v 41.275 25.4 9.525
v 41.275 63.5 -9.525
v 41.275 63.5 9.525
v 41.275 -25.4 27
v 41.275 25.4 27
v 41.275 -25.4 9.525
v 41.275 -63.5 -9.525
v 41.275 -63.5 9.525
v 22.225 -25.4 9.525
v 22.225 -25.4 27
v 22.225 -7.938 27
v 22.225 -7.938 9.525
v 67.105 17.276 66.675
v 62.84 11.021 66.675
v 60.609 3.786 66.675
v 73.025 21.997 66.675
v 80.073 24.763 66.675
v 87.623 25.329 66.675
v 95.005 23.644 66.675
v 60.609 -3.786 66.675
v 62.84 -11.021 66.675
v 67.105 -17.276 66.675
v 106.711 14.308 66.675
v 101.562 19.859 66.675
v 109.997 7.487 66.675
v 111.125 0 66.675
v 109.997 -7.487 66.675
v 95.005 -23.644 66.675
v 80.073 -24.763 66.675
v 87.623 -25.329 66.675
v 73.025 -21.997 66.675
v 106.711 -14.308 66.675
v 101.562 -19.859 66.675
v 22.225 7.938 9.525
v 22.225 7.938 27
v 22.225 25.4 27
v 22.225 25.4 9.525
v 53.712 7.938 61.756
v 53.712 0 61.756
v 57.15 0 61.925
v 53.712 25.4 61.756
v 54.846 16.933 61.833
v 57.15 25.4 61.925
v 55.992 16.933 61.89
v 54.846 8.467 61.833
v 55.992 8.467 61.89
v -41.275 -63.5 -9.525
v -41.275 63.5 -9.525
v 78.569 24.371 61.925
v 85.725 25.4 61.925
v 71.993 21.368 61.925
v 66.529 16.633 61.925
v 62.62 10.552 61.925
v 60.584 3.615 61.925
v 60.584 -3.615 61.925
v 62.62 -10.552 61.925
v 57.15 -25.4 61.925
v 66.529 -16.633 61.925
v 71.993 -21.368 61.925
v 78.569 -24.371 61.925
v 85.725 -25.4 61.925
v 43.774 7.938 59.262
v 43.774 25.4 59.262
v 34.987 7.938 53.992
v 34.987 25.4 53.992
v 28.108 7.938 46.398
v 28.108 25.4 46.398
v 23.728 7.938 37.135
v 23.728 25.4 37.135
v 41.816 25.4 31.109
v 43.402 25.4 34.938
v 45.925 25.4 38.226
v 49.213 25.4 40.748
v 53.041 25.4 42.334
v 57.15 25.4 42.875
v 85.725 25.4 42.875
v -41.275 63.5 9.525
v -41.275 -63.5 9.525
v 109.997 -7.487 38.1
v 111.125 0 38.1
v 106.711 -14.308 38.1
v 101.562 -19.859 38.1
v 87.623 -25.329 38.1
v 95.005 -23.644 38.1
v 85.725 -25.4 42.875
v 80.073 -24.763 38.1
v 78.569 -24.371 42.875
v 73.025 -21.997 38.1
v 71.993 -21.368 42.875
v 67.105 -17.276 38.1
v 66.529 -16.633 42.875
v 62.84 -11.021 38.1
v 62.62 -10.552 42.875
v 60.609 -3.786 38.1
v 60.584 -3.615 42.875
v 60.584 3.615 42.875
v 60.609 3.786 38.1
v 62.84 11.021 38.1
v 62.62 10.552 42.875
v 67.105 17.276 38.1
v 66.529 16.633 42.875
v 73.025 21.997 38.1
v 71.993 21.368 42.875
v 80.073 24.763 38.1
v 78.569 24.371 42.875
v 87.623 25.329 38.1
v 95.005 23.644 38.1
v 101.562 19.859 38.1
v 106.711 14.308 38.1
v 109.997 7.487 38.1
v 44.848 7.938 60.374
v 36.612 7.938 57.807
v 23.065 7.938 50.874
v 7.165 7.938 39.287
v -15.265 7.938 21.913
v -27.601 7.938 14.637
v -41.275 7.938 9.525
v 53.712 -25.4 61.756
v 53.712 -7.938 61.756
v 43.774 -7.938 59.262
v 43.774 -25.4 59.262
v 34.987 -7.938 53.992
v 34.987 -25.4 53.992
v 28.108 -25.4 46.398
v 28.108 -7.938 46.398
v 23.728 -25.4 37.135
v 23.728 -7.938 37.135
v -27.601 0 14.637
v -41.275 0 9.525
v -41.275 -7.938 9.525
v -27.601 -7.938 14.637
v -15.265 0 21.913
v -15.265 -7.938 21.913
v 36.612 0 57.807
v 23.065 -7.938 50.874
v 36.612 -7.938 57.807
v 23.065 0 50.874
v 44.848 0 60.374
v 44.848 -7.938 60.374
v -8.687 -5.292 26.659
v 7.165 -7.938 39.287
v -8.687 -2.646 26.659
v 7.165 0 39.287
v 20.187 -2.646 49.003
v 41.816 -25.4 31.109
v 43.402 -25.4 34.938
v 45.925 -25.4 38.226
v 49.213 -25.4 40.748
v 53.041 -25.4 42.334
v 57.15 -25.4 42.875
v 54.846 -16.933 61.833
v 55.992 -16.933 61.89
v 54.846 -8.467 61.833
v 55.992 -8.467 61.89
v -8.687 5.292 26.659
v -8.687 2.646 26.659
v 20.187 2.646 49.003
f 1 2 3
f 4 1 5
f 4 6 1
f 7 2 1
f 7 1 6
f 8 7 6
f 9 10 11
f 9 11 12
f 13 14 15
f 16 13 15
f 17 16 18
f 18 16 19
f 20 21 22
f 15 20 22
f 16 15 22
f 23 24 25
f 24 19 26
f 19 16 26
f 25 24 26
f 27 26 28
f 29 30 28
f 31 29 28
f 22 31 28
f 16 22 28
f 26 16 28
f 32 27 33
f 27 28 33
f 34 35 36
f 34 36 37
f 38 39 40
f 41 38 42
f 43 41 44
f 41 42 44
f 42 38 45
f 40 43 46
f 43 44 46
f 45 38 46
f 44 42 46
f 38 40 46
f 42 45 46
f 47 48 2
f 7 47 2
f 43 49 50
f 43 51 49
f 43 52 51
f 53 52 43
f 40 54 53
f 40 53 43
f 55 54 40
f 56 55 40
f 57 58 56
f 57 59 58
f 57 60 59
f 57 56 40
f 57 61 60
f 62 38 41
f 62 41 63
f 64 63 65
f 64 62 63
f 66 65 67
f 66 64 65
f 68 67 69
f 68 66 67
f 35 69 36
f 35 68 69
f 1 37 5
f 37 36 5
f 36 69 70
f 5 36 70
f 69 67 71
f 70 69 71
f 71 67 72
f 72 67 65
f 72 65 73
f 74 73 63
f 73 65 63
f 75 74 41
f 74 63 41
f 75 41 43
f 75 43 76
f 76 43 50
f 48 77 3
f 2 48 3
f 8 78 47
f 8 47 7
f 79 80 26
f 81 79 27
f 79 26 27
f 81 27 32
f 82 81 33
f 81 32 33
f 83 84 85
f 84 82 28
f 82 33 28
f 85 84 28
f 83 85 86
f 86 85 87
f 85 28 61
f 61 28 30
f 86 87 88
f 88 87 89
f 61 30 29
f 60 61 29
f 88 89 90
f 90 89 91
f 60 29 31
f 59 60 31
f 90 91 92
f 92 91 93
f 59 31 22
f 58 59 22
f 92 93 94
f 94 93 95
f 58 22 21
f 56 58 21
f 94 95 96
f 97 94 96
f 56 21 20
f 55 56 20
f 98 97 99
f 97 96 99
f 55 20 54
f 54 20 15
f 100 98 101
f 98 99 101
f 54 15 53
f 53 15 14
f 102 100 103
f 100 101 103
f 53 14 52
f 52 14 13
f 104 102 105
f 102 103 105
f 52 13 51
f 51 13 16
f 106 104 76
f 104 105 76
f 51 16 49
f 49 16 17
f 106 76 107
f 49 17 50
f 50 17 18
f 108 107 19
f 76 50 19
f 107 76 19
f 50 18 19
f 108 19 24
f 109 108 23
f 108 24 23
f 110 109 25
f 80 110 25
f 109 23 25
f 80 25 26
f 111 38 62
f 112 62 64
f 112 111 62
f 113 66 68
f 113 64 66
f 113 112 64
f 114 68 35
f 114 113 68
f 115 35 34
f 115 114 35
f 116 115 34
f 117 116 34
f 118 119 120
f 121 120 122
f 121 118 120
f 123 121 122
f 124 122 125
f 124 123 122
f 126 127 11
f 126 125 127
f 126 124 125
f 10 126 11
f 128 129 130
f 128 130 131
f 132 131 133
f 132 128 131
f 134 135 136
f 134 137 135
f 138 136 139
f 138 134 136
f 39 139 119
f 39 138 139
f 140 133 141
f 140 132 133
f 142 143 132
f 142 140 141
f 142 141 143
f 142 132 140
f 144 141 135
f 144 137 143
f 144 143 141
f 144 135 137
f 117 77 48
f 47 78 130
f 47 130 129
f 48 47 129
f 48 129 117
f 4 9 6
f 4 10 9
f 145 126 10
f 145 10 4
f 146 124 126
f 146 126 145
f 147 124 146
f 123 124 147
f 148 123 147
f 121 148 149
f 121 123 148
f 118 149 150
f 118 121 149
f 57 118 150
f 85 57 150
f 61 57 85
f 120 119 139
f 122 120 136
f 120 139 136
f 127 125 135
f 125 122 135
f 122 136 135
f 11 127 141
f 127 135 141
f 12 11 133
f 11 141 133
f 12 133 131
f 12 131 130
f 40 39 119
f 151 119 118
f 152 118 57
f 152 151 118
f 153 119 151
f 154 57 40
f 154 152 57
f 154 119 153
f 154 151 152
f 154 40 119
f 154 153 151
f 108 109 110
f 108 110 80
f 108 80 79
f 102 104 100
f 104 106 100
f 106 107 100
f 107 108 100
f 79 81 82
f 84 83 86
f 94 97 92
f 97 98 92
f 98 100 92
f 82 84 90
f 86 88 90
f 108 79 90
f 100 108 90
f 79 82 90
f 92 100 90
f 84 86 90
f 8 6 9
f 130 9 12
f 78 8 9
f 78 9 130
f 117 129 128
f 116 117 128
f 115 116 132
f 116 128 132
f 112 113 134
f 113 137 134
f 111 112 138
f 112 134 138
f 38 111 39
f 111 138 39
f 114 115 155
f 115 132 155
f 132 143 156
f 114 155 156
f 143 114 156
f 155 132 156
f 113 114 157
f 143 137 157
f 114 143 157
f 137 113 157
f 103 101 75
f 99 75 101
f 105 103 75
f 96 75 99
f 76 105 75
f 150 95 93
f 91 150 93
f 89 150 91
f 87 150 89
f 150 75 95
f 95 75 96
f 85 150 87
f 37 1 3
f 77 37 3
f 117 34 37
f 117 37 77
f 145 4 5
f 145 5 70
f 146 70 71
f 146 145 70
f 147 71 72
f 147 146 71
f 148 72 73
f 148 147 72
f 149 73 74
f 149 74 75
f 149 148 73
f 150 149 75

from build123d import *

# Parameters (mm, degrees)
F1_DEPTH = 63.5
F2_DEPTH = 7.9375
F0_W     = 25.4
F0_H     = 19.05
F3_DEPTH = 25.4


with BuildPart() as f1:
    # F0 (on Front) → F1 (new body, symmetric)
    with BuildSketch(Plane.XZ):
        Polygon((-41.275, 9.525), (-41.275, -9.525), (41.275, -9.525), (41.275, 9.525), (22.225, 9.525), align=None)
    extrude(amount=F1_DEPTH, both=True)

    # F0 (on Front) → F2 (join, symmetric)
    with BuildSketch(Plane.XZ):
        with BuildLine():
            add(Edge.make_bspline(
                [(-41.275, 9.525), (-4.041549, 19.120571), (15.072903, 58.732133), (53.711712, 61.755542)],
                knots=[0, 0, 0, 0, 108.338644, 108.338644, 108.338644, 108.338644], degree=3))
            Line((-41.275, 9.525), (22.225, 9.525))
            Line((22.225, 9.525), (22.225, 27.0002))
            ThreePointArc((22.225, 27.0002), (31.267208, 50.448797), (53.711712, 61.755542))
        make_face()
    extrude(amount=F2_DEPTH, both=True)

    # F0 (on Front) → F3 (join, symmetric)
    with BuildSketch(Plane.XZ):
        with BuildLine():
            Line((22.225, 9.525), (41.275, 9.525))
            Line((41.275, 9.525), (41.275, 27.0002))
            ThreePointArc((41.275, 27.0002), (45.92468, 38.22552), (57.15, 42.8752))
            Line((57.15, 42.8752), (60.325, 42.8752))
            Line((60.325, 42.8752), (60.325, 61.9252))
            Line((60.325, 61.9252), (57.15, 61.9252))
            add(Edge.make_bspline(
                [(53.711712, 61.755542), (54.840822, 61.843893), (55.986605, 61.900999), (57.15, 61.9252)],
                knots=[108.338644, 108.338644, 108.338644, 108.338644, 111.504536, 111.504536, 111.504536, 111.504536], degree=3))
            ThreePointArc((53.711712, 61.755542), (31.267208, 50.448797), (22.225, 27.0002))
            Line((22.225, 27.0002), (22.225, 9.525))
        make_face()
        with Locations((73.025, 52.4002)):
            Rectangle(F0_W, F0_H)
    extrude(amount=F3_DEPTH, both=True)

    # F0 (on Front) → F4 (revolve)
    with BuildSketch(Plane.XZ):
        Polygon((85.725, 66.675), (85.725, 61.9252), (85.725, 42.8752), (85.725, 38.1), (111.125, 38.1), (111.125, 66.675), align=None)
    revolve(axis=Axis((85.725, 0, 52.4002), (0, 0, -1)))


solid = f1.part
